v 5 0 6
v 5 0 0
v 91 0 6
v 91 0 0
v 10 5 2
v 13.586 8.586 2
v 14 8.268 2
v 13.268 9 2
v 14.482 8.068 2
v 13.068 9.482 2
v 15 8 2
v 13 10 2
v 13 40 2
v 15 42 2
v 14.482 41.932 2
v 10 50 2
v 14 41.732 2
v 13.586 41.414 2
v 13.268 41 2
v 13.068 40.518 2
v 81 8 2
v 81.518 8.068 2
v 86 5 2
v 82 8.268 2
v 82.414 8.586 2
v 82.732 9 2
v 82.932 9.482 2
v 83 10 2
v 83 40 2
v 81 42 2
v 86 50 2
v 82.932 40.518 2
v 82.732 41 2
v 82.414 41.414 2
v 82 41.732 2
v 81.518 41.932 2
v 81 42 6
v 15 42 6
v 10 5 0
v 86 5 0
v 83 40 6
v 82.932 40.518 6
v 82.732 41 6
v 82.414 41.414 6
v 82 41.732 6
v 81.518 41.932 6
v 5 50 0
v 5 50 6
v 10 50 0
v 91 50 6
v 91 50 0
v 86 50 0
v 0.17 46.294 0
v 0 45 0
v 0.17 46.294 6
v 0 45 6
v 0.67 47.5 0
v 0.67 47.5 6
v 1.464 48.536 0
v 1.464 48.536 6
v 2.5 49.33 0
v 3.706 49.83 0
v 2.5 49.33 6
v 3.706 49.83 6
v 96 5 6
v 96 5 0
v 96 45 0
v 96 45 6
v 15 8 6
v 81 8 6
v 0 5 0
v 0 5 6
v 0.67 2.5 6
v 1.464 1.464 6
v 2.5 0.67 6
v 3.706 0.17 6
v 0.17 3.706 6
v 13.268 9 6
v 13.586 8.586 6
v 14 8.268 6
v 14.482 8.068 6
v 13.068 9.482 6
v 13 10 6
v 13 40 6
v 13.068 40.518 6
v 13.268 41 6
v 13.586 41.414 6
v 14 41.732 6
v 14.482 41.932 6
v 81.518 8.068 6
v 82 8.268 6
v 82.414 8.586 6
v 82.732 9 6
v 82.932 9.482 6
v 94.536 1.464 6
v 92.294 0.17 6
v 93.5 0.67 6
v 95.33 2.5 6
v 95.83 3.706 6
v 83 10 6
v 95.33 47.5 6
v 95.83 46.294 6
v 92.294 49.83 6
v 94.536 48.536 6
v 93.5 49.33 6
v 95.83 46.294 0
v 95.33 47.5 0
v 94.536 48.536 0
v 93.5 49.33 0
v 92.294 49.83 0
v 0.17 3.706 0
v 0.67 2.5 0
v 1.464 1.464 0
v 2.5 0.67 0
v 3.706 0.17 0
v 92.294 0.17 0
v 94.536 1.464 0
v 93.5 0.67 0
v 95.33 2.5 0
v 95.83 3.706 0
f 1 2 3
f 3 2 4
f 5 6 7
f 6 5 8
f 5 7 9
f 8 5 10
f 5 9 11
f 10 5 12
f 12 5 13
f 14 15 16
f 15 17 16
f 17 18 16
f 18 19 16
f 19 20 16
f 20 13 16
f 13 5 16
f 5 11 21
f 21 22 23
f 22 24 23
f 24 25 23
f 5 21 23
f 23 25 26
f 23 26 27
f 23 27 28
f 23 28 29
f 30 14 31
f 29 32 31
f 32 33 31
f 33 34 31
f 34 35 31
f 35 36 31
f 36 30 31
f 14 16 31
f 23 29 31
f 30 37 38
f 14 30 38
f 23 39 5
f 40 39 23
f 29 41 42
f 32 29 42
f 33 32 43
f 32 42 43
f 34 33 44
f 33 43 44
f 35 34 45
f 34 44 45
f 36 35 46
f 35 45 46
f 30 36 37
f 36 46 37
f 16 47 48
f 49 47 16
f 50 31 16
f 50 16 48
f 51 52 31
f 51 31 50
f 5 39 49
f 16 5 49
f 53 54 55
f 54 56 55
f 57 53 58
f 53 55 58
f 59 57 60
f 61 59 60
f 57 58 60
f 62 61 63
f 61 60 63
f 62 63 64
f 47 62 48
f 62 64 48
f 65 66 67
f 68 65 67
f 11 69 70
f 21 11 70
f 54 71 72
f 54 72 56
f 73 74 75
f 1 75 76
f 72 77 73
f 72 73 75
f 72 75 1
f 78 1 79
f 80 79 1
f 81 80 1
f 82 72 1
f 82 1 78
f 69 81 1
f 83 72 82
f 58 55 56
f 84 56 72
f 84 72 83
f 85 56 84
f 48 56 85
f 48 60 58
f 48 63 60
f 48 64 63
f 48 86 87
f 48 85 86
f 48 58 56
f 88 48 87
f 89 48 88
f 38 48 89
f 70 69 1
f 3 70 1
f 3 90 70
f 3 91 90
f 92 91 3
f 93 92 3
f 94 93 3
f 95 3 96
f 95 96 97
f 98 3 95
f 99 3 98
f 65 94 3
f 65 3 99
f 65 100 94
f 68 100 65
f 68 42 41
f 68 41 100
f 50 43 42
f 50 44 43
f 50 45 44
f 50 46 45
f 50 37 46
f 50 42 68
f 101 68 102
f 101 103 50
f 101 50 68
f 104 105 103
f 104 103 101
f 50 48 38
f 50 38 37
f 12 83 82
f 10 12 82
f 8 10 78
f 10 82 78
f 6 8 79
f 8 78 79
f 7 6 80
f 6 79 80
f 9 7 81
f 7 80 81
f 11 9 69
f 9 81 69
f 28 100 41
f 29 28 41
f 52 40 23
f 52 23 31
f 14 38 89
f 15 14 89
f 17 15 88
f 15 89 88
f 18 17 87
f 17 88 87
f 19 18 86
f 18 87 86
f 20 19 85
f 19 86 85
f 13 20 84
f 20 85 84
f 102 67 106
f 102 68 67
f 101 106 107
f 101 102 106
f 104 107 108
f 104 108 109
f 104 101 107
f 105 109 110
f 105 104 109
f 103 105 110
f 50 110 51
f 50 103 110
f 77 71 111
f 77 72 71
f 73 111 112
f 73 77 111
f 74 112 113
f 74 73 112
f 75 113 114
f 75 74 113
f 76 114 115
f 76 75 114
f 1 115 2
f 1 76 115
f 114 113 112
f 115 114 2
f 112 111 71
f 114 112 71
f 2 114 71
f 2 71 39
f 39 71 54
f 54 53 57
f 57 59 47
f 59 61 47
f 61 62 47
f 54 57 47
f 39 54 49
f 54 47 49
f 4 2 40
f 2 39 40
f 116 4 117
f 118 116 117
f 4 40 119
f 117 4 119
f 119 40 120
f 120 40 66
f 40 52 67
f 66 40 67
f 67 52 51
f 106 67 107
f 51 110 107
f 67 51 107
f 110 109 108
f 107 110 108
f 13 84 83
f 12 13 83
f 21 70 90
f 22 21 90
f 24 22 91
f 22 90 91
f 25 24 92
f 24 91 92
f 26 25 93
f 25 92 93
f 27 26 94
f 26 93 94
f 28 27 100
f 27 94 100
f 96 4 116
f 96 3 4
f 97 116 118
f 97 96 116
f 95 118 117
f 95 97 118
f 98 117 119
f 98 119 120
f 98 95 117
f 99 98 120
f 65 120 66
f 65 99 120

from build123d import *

# Parameters (mm, degrees)
F0_W     = 96
F0_H     = 50
F1_DEPTH = 6
F2_R     = 5
F3_W     = 76
F3_H     = 45
F4_DEPTH = 2
F6_DEPTH = 25


with BuildPart() as f1:
    # F0 (on Top) → F1 (new body)
    with BuildSketch(Plane.XY):
        with Locations((48, 25)):
            Rectangle(F0_W, F0_H)
    extrude(amount=F1_DEPTH)

    # F2
    f2_edges = [f1.edges().sort_by_distance(p)[0] for p in [
        (96, 50, 3),
        (96, 0, 3),
        (0, 50, 3),
        (0, 0, 3),
    ]]
    fillet(f2_edges, radius=F2_R)

    # F3 (on Top) → F4 (cut)
    with BuildSketch(Plane.XY):
        with Locations((48, 27.5)):
            Rectangle(F3_W, F3_H)
    extrude(amount=F4_DEPTH, mode=Mode.SUBTRACT)

    # F5 (on face) → F6 (cut)
    with BuildSketch(Plane.XY.offset(6)):
        with BuildLine():
            Line((81, 42), (15, 42))
            ThreePointArc((15, 42), (13.585786, 41.414214), (13, 40))
            Line((13, 40), (13, 10))
            ThreePointArc((13, 10), (13.585786, 8.585786), (15, 8))
            Line((15, 8), (81, 8))
            ThreePointArc((81, 8), (82.414214, 8.585786), (83, 10))
            Line((83, 10), (83, 40))
            ThreePointArc((83, 40), (82.414214, 41.414214), (81, 42))
        make_face()
    extrude(amount=-F6_DEPTH, mode=Mode.SUBTRACT)


solid = f1.part
